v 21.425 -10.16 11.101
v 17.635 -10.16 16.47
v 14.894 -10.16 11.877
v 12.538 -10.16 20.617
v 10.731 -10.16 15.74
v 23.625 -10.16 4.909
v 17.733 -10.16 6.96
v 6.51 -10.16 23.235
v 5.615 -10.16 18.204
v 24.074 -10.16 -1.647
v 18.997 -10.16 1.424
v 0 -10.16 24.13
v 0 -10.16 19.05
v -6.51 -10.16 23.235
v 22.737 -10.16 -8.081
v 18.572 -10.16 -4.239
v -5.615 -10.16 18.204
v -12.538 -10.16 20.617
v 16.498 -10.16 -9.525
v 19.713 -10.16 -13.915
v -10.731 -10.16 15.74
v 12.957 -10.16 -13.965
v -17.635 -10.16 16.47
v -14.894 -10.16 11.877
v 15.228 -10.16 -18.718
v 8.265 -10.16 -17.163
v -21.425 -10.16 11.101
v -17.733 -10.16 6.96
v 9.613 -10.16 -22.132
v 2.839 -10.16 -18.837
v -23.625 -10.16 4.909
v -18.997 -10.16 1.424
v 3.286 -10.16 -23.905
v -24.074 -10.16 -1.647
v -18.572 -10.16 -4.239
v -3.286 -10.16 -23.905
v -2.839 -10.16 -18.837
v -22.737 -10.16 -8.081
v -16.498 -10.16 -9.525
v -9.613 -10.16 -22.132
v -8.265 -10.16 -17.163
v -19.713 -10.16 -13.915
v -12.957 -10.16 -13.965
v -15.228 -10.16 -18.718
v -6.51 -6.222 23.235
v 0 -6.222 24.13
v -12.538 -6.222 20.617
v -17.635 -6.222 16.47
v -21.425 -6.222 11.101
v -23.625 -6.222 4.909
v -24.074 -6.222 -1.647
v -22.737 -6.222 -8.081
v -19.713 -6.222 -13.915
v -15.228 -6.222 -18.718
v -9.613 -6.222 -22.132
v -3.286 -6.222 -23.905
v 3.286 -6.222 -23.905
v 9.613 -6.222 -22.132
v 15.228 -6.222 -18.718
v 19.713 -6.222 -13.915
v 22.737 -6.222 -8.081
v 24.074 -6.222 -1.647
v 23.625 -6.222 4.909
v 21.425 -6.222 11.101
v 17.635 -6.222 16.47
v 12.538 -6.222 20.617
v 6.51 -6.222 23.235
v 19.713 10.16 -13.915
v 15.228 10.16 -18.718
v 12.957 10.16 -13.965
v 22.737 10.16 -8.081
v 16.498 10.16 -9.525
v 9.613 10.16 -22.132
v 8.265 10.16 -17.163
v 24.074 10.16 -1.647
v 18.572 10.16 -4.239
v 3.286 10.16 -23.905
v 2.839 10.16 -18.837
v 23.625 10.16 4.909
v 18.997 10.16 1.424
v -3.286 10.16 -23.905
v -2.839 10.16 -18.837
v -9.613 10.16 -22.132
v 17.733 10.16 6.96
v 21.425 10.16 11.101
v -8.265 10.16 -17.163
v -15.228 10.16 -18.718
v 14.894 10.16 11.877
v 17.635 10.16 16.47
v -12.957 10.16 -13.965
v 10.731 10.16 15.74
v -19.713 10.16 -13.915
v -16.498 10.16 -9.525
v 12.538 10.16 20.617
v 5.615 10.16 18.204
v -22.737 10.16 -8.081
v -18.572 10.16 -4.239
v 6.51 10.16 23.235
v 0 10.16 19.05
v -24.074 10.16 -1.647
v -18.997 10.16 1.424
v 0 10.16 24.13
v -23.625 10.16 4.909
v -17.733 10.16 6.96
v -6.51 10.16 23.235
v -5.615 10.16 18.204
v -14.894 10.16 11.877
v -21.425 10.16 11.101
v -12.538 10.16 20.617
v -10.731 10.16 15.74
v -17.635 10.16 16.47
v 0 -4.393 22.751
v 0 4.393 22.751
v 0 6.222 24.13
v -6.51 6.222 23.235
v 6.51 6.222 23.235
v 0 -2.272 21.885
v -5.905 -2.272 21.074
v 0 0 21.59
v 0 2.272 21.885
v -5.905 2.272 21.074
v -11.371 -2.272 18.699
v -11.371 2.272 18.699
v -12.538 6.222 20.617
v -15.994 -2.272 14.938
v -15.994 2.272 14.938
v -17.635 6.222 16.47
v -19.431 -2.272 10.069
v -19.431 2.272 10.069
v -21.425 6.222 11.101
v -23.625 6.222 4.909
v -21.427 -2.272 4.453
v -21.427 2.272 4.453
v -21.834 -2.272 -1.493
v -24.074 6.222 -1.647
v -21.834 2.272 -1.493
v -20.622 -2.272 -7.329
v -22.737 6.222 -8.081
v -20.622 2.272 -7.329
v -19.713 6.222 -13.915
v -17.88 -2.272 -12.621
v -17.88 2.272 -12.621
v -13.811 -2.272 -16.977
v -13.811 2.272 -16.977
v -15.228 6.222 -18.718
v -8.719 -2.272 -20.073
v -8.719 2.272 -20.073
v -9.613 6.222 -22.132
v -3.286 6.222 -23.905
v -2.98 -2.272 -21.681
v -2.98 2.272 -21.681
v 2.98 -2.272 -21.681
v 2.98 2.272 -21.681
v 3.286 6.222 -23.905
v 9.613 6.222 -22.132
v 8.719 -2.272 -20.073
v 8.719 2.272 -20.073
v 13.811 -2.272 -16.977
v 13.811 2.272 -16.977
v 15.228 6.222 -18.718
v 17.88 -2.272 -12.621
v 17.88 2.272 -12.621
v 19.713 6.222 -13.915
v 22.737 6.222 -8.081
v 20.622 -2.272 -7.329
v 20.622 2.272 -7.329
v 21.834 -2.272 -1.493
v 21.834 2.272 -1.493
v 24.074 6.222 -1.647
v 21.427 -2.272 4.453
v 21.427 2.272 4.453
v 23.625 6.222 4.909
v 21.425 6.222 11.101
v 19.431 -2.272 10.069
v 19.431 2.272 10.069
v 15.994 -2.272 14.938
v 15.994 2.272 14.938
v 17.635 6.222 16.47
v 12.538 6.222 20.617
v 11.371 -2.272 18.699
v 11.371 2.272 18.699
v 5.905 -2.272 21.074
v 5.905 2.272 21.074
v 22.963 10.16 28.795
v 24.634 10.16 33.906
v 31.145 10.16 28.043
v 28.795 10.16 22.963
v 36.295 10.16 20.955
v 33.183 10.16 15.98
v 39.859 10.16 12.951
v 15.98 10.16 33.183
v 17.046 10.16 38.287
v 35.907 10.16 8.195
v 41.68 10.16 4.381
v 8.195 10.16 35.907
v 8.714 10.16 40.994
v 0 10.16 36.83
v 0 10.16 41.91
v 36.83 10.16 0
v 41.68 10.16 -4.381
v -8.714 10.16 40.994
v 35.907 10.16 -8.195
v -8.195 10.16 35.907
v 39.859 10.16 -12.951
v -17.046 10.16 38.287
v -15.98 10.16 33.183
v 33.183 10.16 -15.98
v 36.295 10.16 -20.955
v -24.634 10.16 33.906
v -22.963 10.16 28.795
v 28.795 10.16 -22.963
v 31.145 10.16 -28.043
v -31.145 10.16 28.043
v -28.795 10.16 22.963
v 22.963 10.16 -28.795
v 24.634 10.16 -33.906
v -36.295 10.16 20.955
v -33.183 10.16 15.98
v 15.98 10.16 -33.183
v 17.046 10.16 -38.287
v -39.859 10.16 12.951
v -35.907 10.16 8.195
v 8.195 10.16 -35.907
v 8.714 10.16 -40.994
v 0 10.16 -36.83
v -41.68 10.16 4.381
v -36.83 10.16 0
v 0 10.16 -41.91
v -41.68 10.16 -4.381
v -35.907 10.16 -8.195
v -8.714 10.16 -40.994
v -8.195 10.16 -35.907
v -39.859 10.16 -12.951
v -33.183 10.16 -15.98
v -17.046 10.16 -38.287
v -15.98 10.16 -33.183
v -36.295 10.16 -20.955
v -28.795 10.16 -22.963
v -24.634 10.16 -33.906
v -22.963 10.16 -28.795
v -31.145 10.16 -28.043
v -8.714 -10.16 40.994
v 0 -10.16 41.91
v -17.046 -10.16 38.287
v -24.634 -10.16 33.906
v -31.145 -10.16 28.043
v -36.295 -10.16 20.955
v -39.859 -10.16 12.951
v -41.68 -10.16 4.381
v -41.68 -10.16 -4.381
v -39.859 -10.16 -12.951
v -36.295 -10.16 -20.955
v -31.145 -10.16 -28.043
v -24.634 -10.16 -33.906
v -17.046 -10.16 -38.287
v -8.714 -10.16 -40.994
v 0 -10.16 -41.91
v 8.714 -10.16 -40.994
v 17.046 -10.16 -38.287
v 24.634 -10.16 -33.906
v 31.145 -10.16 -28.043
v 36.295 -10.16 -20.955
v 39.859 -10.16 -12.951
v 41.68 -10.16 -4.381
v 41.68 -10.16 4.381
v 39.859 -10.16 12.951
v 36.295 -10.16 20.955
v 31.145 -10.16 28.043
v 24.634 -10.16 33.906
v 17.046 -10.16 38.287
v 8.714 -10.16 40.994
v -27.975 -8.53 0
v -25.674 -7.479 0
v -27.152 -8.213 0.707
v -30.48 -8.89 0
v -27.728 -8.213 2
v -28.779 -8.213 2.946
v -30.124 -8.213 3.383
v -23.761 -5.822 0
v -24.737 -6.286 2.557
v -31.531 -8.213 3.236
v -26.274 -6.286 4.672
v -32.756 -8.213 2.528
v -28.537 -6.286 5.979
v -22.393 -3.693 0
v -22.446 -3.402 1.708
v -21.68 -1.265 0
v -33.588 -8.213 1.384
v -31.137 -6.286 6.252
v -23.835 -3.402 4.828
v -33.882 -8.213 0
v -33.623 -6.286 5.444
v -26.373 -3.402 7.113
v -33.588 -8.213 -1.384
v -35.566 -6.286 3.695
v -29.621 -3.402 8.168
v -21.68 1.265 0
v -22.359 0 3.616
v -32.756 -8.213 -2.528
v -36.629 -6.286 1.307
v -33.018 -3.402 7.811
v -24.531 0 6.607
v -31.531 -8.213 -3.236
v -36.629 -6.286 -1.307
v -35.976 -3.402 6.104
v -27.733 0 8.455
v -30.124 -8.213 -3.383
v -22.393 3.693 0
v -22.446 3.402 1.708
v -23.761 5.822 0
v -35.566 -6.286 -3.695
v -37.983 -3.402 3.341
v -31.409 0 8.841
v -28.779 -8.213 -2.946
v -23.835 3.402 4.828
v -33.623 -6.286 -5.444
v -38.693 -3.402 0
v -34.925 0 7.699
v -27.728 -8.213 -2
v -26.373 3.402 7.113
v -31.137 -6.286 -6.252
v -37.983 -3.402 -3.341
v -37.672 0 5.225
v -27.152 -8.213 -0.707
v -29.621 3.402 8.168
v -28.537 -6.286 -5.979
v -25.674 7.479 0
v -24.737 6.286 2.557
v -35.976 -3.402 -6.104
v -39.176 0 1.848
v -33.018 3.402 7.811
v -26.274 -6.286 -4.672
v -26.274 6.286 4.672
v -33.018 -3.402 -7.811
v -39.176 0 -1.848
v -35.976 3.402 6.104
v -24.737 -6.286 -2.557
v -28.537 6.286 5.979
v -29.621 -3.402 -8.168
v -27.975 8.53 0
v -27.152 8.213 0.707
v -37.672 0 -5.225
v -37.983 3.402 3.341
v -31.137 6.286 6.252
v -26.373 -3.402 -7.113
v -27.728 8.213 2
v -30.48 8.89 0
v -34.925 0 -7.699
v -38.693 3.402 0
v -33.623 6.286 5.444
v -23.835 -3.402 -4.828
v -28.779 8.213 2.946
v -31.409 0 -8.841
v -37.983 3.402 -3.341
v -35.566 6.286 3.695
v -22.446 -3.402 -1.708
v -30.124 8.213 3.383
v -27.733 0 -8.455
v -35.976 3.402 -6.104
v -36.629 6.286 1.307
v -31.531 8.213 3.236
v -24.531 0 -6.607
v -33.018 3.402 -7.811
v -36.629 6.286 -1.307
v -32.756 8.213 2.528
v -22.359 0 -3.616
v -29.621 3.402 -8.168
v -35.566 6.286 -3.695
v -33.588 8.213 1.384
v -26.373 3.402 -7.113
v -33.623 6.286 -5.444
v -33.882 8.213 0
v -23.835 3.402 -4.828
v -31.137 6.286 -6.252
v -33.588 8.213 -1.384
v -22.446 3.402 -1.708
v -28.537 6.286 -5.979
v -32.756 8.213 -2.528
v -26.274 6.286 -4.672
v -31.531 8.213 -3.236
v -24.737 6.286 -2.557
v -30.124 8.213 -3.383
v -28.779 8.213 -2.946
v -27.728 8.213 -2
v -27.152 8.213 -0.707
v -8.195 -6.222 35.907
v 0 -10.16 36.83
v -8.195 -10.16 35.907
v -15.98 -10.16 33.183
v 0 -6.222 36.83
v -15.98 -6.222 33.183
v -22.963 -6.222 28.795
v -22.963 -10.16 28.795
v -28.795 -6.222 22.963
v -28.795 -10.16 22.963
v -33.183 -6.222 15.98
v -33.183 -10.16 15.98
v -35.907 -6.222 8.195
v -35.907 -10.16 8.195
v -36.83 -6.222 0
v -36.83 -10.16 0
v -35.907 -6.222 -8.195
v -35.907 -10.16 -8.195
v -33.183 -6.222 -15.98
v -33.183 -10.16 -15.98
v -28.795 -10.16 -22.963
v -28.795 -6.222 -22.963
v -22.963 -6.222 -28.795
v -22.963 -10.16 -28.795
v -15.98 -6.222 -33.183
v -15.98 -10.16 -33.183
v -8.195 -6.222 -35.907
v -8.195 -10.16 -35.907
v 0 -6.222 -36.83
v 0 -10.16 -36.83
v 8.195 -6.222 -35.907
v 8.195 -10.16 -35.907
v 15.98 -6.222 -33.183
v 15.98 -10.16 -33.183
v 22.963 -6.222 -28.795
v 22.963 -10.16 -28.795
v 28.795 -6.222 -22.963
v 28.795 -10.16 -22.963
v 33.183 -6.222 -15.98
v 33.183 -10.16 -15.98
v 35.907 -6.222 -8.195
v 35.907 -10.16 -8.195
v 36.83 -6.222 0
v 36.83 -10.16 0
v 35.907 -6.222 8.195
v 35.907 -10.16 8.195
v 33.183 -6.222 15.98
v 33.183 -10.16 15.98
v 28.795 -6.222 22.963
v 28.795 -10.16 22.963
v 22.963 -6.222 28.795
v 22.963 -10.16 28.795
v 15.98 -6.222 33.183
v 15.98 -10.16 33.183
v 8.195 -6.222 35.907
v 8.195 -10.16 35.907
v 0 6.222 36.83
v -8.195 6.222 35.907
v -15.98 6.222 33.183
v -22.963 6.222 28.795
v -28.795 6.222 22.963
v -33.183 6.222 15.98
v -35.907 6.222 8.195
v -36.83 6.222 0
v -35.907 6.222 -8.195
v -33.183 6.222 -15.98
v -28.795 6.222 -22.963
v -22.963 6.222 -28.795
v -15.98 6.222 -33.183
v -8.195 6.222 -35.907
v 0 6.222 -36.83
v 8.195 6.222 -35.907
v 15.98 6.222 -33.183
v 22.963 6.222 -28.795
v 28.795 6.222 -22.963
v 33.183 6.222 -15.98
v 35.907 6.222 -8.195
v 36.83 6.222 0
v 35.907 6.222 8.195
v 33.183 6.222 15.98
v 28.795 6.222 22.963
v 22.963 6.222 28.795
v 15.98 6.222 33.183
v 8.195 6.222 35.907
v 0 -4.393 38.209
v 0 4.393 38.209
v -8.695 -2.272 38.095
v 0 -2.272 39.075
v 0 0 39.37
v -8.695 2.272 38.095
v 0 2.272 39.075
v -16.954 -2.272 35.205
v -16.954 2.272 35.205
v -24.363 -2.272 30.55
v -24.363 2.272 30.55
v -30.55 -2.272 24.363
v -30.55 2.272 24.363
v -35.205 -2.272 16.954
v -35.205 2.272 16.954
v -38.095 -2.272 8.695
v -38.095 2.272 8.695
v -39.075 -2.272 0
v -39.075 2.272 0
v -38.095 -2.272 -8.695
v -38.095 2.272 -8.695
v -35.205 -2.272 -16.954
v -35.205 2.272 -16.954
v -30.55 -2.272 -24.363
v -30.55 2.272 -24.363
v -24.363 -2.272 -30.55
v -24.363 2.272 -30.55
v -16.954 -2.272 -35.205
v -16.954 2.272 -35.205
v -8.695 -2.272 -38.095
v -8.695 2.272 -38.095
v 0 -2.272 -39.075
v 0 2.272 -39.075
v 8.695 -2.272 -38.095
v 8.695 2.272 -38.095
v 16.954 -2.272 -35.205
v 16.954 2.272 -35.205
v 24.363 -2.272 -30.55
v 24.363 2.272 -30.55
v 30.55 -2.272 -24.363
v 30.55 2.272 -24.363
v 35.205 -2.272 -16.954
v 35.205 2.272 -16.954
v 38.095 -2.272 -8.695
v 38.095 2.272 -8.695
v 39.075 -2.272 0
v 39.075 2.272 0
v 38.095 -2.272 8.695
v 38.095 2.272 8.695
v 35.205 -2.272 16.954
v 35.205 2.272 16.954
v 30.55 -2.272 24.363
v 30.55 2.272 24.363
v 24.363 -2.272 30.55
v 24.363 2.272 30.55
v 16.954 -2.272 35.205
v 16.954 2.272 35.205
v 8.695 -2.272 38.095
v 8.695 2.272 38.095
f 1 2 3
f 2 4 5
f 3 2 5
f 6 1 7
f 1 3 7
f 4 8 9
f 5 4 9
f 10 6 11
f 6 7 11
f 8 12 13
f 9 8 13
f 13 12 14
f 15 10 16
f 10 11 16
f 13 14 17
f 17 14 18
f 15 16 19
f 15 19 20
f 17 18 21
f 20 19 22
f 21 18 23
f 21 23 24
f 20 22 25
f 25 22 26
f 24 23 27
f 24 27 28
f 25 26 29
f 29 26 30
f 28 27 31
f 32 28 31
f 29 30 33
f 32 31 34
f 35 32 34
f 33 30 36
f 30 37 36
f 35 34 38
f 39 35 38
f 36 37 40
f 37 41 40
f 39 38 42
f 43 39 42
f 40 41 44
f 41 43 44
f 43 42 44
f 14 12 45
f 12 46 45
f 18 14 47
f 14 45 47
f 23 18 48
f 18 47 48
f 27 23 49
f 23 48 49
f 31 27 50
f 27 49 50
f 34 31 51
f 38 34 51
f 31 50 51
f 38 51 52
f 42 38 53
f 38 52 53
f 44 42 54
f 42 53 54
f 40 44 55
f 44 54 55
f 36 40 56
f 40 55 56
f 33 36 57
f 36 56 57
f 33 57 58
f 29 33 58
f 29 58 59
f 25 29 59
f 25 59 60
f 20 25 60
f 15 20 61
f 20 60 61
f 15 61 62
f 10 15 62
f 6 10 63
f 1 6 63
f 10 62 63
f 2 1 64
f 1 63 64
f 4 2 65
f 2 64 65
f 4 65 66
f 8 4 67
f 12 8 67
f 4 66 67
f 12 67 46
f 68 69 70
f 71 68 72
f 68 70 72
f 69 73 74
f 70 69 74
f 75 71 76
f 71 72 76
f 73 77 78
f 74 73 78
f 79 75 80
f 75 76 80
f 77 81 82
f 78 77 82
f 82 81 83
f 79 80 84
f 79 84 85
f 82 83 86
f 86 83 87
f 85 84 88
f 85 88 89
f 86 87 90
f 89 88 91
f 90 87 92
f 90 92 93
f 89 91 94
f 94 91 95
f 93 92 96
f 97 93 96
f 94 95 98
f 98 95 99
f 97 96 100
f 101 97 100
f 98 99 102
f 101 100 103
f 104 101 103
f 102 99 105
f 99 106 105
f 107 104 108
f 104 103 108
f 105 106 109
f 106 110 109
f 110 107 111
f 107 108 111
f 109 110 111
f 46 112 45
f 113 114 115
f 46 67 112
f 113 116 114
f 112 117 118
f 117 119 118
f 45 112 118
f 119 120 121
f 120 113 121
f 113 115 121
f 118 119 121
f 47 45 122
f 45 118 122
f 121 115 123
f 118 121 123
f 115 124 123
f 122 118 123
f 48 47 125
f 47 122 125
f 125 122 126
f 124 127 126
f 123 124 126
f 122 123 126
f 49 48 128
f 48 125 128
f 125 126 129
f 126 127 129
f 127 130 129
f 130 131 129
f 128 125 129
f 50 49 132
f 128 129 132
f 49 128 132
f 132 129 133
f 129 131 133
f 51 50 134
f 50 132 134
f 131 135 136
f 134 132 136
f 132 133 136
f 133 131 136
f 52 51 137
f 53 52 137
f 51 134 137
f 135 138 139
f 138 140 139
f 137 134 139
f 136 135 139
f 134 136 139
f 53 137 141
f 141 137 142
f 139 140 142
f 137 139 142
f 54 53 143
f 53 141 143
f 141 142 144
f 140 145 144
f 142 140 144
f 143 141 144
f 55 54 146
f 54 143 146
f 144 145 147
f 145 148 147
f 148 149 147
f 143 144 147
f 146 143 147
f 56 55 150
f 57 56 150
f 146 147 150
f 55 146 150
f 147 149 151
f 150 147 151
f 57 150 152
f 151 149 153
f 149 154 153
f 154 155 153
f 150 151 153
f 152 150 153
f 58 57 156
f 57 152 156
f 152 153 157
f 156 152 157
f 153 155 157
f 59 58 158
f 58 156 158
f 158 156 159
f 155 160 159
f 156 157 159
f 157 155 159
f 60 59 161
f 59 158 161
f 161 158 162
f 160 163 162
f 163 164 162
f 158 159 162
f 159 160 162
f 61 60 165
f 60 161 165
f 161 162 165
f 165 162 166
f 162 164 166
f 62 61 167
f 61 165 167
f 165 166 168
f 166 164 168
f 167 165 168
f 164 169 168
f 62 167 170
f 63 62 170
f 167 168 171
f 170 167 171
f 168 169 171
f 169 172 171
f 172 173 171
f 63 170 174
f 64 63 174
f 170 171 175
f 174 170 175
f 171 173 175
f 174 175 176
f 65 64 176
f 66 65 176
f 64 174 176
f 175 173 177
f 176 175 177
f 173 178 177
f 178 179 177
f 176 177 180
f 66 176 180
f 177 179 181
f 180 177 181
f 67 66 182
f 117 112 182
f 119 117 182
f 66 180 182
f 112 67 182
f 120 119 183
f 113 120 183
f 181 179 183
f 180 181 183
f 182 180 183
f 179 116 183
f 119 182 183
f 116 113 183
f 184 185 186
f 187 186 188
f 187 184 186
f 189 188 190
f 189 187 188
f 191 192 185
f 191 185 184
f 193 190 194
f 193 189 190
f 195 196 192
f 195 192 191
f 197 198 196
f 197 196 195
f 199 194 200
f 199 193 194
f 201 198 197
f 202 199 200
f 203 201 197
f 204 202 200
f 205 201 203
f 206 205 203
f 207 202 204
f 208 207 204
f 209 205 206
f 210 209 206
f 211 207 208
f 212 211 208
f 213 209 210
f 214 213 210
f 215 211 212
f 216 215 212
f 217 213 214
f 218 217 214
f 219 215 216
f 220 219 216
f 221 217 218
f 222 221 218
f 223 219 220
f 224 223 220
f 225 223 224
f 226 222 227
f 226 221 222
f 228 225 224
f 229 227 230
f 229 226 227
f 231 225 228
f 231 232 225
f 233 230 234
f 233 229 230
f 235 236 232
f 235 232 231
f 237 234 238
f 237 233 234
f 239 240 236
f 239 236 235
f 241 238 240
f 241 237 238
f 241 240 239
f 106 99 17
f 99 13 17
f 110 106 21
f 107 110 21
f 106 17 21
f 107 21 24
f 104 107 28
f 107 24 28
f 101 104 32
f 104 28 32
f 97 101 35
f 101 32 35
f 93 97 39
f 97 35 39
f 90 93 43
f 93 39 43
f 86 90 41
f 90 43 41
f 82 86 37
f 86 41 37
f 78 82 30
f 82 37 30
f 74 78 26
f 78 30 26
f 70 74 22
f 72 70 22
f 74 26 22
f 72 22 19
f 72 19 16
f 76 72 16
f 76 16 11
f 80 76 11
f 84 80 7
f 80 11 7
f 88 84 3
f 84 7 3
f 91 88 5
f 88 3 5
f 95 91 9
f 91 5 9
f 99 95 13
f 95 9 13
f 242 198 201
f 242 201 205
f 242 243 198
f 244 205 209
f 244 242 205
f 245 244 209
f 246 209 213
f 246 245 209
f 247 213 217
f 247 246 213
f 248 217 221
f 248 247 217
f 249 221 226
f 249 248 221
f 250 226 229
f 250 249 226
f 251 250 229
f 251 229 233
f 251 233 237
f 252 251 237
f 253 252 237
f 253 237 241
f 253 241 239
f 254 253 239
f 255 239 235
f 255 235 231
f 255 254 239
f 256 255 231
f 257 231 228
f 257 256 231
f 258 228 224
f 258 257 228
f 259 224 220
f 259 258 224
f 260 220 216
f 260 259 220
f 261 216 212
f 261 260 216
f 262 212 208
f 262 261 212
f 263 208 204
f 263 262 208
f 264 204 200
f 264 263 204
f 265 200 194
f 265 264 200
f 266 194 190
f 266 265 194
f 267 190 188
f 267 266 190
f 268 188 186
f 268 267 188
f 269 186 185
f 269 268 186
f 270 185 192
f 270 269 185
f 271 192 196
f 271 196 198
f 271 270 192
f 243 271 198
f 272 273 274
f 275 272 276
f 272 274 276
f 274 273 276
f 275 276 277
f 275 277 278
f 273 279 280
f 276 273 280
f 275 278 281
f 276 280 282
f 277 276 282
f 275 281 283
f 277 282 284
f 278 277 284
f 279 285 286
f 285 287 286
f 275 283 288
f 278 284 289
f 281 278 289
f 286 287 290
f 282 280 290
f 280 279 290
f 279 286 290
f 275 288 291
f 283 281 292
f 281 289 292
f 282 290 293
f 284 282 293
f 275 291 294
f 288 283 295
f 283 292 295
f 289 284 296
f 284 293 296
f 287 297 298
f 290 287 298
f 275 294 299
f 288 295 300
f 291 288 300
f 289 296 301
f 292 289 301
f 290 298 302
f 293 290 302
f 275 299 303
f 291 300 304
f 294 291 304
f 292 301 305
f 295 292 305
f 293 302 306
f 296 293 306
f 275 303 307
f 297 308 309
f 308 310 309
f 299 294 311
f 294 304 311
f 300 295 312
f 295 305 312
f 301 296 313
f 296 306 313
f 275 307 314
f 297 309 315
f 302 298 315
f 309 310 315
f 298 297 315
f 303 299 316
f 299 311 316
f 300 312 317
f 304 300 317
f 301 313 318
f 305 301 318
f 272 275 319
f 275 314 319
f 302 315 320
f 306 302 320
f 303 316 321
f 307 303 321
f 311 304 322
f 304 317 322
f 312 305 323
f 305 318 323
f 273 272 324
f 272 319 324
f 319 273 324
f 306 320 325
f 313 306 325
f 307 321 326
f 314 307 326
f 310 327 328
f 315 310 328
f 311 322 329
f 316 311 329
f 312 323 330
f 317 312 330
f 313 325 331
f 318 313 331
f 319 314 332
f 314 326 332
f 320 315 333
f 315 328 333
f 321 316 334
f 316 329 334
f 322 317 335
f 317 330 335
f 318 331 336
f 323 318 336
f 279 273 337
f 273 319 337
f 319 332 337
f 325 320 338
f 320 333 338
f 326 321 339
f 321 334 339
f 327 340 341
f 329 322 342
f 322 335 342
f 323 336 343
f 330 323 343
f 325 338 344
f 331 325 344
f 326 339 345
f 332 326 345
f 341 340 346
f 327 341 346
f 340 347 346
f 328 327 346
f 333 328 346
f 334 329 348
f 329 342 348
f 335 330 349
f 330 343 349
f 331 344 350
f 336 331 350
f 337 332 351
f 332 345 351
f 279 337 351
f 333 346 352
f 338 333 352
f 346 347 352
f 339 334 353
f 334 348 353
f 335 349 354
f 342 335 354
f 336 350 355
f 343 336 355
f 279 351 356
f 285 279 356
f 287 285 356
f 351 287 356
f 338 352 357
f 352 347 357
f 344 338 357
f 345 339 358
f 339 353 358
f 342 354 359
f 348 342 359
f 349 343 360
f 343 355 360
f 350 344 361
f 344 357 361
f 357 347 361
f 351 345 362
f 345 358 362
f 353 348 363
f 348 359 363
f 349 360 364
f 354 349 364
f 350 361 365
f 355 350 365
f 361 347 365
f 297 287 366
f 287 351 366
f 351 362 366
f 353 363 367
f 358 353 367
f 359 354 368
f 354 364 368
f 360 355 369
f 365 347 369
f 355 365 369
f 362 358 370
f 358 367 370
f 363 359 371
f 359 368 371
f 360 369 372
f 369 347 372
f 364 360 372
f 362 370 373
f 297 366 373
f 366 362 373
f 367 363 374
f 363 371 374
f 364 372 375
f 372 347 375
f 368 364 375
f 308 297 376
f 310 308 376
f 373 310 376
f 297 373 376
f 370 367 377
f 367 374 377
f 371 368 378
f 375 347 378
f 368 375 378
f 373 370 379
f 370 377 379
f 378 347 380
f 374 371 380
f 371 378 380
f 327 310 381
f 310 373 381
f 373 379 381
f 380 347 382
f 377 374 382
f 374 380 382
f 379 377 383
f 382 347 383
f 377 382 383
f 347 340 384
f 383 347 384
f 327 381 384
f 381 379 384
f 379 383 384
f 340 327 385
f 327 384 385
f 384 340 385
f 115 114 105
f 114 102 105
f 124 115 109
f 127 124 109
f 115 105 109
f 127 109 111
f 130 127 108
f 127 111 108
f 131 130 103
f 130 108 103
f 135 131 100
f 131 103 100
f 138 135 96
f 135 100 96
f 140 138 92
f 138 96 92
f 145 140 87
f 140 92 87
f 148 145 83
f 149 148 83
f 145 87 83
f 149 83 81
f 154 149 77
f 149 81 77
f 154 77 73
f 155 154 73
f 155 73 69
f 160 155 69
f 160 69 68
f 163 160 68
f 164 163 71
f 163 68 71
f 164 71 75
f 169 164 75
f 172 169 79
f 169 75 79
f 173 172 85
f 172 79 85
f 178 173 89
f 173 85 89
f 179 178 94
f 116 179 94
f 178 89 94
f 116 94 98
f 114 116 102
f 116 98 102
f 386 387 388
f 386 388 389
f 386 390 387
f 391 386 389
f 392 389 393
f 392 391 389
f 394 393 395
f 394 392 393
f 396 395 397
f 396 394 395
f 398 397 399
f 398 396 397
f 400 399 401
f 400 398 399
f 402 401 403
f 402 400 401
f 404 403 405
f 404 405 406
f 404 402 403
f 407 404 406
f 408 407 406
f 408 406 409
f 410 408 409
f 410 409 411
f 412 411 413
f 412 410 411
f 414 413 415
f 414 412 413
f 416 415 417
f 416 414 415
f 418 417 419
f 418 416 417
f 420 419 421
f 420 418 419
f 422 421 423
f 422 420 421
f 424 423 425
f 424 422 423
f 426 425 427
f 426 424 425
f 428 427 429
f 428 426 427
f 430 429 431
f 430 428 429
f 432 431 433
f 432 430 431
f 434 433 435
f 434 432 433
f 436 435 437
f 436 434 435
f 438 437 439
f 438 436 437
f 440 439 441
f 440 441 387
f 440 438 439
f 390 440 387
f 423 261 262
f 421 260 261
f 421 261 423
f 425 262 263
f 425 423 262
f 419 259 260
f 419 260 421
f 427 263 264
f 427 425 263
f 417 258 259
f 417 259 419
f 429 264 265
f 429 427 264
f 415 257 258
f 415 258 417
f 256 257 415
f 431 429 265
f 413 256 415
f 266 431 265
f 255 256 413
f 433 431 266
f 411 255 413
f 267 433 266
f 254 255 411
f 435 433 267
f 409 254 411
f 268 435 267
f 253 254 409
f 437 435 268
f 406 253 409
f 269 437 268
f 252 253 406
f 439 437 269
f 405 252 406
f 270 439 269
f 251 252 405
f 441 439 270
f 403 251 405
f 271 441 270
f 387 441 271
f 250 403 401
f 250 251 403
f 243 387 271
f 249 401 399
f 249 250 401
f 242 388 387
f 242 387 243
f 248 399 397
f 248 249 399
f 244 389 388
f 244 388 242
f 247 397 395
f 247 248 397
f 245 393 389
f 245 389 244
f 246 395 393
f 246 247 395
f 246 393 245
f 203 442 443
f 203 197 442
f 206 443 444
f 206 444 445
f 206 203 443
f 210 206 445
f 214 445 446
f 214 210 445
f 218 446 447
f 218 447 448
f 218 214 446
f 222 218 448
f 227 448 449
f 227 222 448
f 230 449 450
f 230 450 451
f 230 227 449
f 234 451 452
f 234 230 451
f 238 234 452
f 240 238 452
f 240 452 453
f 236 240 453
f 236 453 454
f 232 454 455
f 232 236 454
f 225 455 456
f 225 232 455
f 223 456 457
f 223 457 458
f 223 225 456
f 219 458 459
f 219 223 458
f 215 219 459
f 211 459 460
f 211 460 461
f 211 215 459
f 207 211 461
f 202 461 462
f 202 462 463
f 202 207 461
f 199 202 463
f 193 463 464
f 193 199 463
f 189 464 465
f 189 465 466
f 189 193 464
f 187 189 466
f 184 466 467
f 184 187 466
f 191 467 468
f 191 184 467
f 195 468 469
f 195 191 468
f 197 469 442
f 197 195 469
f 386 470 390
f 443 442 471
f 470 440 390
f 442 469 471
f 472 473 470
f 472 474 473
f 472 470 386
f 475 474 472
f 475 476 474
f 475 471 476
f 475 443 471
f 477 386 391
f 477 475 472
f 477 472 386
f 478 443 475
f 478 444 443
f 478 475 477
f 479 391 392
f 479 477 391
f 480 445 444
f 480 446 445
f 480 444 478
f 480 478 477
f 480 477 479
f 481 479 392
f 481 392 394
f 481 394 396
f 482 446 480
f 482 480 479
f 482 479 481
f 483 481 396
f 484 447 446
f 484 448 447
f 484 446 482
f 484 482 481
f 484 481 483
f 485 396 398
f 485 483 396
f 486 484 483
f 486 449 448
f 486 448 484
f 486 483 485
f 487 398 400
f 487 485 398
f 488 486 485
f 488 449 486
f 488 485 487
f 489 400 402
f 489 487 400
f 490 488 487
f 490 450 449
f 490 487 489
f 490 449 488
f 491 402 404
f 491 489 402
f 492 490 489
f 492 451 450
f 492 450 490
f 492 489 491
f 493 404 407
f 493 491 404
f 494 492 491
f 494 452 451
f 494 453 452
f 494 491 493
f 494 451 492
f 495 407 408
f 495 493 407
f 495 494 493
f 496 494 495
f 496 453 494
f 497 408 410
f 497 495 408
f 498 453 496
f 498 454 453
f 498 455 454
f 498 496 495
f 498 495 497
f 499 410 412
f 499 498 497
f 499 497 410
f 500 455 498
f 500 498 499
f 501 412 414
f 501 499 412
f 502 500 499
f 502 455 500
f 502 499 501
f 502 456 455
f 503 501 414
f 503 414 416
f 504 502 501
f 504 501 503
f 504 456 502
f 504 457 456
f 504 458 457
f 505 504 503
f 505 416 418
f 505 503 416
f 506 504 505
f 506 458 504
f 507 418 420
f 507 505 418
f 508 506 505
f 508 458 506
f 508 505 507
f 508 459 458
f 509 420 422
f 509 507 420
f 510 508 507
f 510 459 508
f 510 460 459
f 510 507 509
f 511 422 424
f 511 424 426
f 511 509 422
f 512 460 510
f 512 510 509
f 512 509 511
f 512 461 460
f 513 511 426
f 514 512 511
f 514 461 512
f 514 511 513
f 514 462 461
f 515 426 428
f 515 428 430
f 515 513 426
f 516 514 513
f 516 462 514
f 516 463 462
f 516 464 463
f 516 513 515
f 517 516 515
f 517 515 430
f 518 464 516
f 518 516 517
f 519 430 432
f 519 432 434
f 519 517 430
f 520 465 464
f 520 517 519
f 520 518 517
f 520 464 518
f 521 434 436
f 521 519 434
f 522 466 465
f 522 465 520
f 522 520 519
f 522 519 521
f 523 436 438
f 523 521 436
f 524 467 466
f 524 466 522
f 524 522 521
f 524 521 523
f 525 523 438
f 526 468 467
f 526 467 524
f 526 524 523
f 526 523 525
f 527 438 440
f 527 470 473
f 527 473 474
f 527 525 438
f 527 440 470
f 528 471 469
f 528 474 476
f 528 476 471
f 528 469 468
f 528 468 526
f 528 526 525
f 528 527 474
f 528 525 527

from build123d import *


with BuildPart() as part:
    # Sketch2 → Revolve1 (revolve)
    with BuildSketch(Plane.XY):
        with BuildLine():
            ThreePointArc((-30.48, -8.889999836), (-21.59, 1.64e-07), (-30.48, 8.890000164))
            Line((-30.48, 8.890000164), (-30.48, -8.889999836))
        make_face()
    revolve(axis=Axis((-30.48, 10.589901025, 0), (0, -1, 0)))


with BuildPart() as body_2:
    # Sketch1 → Revolve2 (revolve)
    with BuildSketch(Plane.XY, mode=Mode.PRIVATE) as revolve2_sk:
        with BuildLine():
            Line((-41.91, -10.159999672), (-36.83, -10.159999672))
            Line((-36.83, -10.159999672), (-36.83, -6.221703783))
            ThreePointArc((-36.83, -6.221703783), (-39.37, 1.64e-07), (-36.83, 6.221704111))
            Line((-36.83, 6.221704111), (-36.83, 10.160000328))
            Line((-36.83, 10.160000328), (-41.91, 10.160000328))
            Line((-41.91, 10.160000328), (-41.91, -10.159999672))
        make_face()
        with BuildLine():
            Line((-19.05, -10.16), (-24.13, -10.16))
            Line((-24.13, -10.16), (-24.13, -6.221703783))
            ThreePointArc((-24.13, -6.221703783), (-21.59, 1.64e-07), (-24.13, 6.221704111))
            Line((-24.13, 6.221704111), (-24.13, 10.16))
            Line((-24.13, 10.16), (-19.05, 10.16))
            Line((-19.05, 10.16), (-19.05, -10.16))
        make_face()
    revolve(revolve2_sk.sketch.rotate(Axis((0, 11.176000344, 0), (0, -1, 0)), 270), axis=Axis((0, 11.176000344, 0), (0, -1, 0)))


solid = Compound([part.part, body_2.part])
